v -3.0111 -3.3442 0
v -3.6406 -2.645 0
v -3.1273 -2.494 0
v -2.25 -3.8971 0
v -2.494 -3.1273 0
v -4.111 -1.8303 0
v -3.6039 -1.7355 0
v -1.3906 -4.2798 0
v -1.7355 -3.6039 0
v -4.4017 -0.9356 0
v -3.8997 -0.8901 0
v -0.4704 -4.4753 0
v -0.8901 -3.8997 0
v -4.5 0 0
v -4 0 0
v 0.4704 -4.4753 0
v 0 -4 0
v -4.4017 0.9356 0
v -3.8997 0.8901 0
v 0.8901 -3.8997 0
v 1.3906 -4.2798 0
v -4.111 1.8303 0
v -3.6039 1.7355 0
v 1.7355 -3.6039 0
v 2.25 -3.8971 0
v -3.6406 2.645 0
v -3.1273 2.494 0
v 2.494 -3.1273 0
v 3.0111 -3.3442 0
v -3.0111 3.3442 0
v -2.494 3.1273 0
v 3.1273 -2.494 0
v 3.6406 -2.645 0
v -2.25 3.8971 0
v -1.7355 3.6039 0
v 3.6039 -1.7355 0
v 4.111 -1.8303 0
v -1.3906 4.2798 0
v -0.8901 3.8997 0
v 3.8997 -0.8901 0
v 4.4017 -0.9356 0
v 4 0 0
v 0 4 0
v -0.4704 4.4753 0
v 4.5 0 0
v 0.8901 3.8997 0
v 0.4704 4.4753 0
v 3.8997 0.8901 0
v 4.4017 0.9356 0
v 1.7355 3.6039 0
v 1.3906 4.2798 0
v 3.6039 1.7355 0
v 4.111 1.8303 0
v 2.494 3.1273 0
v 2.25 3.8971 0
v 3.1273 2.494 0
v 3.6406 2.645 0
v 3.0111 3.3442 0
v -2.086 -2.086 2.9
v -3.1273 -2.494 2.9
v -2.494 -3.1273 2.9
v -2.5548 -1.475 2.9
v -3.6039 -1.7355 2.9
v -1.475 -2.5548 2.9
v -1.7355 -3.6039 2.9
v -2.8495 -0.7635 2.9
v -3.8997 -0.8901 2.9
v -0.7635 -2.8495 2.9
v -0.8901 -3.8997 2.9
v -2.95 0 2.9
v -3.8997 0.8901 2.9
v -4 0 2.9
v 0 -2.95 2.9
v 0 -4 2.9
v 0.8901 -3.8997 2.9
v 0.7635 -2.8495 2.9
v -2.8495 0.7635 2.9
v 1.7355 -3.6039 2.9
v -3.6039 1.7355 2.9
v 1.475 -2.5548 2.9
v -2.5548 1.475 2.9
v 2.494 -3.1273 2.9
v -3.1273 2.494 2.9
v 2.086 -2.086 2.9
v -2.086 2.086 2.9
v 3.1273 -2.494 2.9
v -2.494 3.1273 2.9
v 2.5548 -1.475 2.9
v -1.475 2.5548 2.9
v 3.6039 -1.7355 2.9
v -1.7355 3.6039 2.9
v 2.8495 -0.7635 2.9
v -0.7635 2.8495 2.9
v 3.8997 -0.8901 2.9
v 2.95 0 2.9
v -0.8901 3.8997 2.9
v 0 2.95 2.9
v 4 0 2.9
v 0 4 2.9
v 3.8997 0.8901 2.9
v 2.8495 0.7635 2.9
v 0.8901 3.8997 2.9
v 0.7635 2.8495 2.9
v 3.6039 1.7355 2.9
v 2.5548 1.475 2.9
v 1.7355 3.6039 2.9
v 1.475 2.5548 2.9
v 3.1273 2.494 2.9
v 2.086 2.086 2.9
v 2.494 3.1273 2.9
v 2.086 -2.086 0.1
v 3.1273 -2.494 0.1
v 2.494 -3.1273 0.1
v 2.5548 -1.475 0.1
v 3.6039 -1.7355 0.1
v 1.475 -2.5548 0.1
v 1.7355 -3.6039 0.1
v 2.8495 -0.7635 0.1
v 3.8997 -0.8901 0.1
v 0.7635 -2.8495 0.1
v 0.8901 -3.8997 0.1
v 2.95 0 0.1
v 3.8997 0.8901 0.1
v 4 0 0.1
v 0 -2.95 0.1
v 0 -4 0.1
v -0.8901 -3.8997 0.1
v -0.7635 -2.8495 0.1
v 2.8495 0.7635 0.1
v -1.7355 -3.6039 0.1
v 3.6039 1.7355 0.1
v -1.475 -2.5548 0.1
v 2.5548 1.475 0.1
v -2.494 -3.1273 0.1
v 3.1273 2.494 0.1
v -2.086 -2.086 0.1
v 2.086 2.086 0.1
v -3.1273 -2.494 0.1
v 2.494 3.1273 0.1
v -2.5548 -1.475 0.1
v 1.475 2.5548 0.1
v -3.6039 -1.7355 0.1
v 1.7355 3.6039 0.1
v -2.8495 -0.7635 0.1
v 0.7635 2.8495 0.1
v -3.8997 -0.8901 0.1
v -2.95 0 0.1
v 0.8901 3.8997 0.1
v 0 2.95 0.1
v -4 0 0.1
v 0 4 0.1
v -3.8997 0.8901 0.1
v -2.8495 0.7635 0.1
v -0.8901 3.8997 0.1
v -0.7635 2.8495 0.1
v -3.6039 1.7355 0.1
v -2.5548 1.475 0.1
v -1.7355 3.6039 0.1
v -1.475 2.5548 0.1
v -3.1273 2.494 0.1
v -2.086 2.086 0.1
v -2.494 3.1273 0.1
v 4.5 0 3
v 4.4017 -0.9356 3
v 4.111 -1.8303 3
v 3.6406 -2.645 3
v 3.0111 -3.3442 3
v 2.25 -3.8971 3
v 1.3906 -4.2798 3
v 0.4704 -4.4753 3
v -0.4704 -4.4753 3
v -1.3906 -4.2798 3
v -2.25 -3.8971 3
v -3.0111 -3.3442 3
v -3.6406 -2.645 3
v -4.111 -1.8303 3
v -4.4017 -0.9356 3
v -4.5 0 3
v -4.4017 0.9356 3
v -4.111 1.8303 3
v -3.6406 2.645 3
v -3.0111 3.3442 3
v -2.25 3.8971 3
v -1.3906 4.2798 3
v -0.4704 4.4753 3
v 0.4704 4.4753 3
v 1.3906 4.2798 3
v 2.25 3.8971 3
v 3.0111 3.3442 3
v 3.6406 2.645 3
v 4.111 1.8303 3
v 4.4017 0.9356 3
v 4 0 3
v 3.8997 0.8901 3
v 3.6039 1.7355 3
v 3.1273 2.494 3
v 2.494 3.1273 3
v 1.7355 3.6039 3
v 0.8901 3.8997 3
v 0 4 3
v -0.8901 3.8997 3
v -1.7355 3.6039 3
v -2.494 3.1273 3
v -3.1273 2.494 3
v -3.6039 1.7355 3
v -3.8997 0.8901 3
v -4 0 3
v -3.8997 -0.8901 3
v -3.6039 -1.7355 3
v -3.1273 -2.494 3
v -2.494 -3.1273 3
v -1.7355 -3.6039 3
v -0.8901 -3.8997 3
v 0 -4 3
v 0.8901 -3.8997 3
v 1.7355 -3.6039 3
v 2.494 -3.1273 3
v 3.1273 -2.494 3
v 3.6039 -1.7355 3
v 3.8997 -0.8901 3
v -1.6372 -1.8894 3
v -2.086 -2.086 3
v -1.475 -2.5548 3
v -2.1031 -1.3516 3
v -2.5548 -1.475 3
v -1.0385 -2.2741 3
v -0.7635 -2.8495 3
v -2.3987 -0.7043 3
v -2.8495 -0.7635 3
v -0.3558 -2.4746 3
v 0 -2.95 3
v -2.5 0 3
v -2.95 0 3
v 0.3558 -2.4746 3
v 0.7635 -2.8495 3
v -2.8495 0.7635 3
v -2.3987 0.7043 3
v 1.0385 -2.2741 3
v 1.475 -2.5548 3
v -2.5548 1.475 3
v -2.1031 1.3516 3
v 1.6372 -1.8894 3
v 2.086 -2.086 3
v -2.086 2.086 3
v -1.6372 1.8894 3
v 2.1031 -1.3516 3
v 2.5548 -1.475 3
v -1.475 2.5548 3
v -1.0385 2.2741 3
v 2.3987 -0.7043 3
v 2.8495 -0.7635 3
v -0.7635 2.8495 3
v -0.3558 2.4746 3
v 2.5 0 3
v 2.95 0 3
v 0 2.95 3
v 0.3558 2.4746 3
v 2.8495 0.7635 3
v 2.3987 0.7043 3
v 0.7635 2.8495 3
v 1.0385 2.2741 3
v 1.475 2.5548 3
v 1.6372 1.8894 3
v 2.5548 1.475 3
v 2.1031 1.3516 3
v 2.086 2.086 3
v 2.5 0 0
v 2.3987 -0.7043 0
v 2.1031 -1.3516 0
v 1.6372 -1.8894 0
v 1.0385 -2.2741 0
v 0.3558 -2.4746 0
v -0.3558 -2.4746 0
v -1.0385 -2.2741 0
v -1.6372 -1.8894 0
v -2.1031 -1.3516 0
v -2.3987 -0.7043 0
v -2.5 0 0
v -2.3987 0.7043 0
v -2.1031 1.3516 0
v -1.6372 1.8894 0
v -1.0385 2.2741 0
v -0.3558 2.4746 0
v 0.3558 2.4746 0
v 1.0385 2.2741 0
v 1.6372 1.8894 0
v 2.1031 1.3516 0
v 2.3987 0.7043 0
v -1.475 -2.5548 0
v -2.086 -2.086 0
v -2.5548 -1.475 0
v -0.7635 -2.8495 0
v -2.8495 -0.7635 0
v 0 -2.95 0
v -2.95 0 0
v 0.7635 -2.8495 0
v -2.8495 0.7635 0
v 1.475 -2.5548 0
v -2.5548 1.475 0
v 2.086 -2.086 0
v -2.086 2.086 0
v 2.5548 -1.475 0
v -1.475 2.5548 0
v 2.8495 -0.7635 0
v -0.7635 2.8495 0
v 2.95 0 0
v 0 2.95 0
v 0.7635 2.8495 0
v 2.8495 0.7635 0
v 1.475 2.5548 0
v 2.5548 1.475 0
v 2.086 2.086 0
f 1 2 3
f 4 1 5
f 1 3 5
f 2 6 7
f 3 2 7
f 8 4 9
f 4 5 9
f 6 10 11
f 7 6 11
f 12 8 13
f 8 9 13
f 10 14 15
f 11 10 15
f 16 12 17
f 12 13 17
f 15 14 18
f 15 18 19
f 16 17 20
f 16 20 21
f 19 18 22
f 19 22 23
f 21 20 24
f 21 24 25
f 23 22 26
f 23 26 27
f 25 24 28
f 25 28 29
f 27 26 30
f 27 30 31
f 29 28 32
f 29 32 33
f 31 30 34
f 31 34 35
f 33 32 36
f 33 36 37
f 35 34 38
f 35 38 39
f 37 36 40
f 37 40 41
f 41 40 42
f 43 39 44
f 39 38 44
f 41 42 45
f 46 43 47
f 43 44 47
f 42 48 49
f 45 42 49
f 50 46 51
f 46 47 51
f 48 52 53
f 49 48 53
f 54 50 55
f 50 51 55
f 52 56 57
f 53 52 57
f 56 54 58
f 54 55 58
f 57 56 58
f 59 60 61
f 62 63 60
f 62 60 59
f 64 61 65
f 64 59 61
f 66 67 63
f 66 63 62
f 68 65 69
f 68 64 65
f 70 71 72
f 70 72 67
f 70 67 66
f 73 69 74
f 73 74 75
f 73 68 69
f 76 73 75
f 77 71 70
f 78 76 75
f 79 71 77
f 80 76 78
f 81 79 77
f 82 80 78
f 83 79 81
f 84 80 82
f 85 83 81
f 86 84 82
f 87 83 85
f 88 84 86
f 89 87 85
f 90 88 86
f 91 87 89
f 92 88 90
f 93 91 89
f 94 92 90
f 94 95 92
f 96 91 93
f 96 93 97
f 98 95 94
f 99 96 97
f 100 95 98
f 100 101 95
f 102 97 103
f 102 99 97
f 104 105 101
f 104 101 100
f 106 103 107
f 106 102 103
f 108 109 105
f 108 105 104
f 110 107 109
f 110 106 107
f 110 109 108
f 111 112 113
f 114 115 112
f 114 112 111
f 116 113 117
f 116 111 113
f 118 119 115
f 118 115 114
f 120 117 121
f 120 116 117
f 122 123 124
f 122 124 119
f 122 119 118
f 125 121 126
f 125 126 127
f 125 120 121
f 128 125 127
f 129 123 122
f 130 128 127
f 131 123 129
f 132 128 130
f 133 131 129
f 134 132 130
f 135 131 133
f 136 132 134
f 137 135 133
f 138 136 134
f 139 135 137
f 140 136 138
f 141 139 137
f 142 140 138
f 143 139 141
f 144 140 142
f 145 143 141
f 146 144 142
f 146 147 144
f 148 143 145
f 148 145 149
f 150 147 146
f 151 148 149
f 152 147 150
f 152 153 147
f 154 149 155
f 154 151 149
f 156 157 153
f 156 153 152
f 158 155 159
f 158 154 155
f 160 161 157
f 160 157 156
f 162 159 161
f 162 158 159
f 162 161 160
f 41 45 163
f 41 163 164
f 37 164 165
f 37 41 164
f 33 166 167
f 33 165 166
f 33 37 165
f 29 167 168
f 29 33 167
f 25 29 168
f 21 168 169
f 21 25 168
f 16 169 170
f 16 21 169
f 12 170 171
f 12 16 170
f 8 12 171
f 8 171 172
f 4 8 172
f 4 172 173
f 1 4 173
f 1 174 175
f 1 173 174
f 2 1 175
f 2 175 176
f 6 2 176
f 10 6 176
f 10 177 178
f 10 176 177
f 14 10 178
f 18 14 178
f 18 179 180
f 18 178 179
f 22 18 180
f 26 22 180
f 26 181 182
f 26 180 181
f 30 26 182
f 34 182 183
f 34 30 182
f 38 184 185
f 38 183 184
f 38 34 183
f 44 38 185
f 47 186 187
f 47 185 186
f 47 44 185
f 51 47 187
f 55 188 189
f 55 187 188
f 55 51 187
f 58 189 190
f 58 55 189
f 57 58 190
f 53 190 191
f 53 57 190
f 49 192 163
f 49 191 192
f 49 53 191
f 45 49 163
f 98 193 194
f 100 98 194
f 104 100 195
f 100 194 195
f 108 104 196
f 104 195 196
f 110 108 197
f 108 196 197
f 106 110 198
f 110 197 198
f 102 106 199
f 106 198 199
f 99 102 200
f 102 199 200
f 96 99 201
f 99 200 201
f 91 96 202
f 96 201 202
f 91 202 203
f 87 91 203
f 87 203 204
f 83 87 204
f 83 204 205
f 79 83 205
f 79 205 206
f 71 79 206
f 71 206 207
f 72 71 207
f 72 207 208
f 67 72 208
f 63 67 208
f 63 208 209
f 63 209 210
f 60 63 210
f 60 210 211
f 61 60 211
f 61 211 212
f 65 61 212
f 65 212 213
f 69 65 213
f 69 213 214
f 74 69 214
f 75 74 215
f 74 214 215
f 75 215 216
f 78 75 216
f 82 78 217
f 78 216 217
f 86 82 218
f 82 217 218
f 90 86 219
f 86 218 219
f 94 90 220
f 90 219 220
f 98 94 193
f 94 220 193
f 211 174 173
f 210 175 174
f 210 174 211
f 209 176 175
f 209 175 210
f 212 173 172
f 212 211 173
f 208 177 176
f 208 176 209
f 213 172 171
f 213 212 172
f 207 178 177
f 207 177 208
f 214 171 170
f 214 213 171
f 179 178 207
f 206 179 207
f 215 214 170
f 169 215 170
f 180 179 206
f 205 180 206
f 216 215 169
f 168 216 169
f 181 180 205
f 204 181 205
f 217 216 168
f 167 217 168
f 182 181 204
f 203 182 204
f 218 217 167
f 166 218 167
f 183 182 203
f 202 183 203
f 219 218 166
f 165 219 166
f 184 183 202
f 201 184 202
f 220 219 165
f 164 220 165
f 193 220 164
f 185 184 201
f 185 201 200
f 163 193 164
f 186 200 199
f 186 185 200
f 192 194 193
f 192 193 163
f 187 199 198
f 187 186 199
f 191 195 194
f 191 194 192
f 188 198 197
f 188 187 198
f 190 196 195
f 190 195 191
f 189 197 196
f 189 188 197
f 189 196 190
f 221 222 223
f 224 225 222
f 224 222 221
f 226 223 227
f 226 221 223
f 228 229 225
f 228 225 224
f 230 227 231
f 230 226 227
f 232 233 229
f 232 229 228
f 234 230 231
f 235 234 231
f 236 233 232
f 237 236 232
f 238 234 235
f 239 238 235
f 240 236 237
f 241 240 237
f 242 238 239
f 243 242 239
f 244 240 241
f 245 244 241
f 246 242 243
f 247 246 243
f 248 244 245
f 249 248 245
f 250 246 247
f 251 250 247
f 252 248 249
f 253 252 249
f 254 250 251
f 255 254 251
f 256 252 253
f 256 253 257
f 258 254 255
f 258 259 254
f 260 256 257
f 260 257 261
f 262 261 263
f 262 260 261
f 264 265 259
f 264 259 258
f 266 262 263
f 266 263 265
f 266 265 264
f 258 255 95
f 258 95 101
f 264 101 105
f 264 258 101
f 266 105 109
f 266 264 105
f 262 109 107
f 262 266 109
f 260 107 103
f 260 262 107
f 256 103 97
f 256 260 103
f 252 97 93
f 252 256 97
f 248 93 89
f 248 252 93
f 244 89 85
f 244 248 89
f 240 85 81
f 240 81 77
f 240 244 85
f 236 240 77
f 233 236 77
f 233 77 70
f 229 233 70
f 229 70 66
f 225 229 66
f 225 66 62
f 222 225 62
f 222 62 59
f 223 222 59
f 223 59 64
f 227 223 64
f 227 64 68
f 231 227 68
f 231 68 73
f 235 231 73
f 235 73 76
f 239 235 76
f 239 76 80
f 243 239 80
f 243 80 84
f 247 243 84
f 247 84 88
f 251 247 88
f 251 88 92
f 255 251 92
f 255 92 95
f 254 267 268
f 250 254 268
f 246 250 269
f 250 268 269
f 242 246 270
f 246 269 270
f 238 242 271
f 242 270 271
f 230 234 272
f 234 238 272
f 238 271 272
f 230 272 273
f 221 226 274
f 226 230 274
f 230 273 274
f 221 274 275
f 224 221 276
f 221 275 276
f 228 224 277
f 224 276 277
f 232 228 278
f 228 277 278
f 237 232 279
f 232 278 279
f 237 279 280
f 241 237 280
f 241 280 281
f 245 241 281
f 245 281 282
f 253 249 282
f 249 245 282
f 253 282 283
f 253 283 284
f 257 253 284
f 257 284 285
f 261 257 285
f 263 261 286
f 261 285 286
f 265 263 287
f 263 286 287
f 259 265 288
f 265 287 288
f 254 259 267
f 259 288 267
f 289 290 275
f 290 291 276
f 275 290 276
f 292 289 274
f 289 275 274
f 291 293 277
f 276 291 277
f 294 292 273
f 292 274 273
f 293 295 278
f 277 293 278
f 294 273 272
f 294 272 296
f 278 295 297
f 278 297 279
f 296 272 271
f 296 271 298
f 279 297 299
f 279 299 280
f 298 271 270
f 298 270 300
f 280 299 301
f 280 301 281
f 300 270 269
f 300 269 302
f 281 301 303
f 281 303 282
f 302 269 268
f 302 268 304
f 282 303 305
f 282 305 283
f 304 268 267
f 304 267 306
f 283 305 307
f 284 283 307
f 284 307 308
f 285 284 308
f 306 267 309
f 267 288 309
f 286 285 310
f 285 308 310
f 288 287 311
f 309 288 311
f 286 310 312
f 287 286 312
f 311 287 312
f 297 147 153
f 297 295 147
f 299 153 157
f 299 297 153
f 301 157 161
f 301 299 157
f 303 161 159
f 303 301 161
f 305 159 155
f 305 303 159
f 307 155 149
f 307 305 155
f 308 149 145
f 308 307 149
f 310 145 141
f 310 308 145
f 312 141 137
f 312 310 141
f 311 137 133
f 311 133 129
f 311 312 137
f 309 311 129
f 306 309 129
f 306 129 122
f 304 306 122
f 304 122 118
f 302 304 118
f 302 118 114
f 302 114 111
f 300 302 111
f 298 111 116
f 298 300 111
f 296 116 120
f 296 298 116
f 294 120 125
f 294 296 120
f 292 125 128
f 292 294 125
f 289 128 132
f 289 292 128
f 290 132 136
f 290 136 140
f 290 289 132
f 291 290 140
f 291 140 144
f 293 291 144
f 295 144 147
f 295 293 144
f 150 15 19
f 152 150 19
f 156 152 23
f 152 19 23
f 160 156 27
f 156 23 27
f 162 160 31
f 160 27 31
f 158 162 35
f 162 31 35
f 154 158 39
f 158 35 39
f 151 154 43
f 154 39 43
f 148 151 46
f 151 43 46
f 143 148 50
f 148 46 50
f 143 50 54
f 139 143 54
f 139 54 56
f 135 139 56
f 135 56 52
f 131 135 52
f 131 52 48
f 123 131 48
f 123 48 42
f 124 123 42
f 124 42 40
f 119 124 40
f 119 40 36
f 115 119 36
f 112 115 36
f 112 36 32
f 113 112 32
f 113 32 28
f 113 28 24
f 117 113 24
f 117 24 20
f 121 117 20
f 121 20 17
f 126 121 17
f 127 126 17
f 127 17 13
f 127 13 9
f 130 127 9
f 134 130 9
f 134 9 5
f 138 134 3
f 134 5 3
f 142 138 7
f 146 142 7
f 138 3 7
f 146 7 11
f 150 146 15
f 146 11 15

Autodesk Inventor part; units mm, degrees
ref_plane "YZ Plane" through (0, 0, 0) normal (1, 0, 0) x (0, 1, 0)
ref_plane "XZ Plane" through (0, 0, 0) normal (0, 1, 0) x (-1, 0, 0)
ref_plane "XY Plane" through (0, 0, 0) normal (0, 0, 1) x (1, 0, 0)
sketch "Sketch1" plane through (0, 0, 0) normal (0, 0, 1) x (1, 0, 0)
  circle A0 centre (0, 0) radius 2.5
  circle A1 centre (0, 0) radius 4.5
  dimension "d0" = 9
  dimension "d1" = 5
extrude "Extrusion1" add sketch "Sketch1" along normal blind 3
sketch "Sketch2" plane through (0, 0, 3) normal (0, 0, 1) x (1, 0, 0)
  circle A0 centre (0, 0) radius 2.5 projected
  circle A1 centre (0, 0) radius 4.5 projected
  circle A2 centre (0, 0) radius 2.95
  circle A3 centre (0, 0) radius 4
  dimension "d4" = 5.9
  dimension "d5" = 0.5
extrude "Extrusion2" cut sketch "Sketch2" against normal blind 0.1 contours A3
sketch "Sketch3" plane through (0, 0, 0) normal (0, 0, -1) x (-1, 0, 0)
  circle A0 centre (0, 0) radius 4 projected
  circle A1 centre (0, 0) radius 2.95 projected
extrude "Extrusion3" cut sketch "Sketch3" against normal blind 0.1
properties part number "9x5x3mm bearing"
